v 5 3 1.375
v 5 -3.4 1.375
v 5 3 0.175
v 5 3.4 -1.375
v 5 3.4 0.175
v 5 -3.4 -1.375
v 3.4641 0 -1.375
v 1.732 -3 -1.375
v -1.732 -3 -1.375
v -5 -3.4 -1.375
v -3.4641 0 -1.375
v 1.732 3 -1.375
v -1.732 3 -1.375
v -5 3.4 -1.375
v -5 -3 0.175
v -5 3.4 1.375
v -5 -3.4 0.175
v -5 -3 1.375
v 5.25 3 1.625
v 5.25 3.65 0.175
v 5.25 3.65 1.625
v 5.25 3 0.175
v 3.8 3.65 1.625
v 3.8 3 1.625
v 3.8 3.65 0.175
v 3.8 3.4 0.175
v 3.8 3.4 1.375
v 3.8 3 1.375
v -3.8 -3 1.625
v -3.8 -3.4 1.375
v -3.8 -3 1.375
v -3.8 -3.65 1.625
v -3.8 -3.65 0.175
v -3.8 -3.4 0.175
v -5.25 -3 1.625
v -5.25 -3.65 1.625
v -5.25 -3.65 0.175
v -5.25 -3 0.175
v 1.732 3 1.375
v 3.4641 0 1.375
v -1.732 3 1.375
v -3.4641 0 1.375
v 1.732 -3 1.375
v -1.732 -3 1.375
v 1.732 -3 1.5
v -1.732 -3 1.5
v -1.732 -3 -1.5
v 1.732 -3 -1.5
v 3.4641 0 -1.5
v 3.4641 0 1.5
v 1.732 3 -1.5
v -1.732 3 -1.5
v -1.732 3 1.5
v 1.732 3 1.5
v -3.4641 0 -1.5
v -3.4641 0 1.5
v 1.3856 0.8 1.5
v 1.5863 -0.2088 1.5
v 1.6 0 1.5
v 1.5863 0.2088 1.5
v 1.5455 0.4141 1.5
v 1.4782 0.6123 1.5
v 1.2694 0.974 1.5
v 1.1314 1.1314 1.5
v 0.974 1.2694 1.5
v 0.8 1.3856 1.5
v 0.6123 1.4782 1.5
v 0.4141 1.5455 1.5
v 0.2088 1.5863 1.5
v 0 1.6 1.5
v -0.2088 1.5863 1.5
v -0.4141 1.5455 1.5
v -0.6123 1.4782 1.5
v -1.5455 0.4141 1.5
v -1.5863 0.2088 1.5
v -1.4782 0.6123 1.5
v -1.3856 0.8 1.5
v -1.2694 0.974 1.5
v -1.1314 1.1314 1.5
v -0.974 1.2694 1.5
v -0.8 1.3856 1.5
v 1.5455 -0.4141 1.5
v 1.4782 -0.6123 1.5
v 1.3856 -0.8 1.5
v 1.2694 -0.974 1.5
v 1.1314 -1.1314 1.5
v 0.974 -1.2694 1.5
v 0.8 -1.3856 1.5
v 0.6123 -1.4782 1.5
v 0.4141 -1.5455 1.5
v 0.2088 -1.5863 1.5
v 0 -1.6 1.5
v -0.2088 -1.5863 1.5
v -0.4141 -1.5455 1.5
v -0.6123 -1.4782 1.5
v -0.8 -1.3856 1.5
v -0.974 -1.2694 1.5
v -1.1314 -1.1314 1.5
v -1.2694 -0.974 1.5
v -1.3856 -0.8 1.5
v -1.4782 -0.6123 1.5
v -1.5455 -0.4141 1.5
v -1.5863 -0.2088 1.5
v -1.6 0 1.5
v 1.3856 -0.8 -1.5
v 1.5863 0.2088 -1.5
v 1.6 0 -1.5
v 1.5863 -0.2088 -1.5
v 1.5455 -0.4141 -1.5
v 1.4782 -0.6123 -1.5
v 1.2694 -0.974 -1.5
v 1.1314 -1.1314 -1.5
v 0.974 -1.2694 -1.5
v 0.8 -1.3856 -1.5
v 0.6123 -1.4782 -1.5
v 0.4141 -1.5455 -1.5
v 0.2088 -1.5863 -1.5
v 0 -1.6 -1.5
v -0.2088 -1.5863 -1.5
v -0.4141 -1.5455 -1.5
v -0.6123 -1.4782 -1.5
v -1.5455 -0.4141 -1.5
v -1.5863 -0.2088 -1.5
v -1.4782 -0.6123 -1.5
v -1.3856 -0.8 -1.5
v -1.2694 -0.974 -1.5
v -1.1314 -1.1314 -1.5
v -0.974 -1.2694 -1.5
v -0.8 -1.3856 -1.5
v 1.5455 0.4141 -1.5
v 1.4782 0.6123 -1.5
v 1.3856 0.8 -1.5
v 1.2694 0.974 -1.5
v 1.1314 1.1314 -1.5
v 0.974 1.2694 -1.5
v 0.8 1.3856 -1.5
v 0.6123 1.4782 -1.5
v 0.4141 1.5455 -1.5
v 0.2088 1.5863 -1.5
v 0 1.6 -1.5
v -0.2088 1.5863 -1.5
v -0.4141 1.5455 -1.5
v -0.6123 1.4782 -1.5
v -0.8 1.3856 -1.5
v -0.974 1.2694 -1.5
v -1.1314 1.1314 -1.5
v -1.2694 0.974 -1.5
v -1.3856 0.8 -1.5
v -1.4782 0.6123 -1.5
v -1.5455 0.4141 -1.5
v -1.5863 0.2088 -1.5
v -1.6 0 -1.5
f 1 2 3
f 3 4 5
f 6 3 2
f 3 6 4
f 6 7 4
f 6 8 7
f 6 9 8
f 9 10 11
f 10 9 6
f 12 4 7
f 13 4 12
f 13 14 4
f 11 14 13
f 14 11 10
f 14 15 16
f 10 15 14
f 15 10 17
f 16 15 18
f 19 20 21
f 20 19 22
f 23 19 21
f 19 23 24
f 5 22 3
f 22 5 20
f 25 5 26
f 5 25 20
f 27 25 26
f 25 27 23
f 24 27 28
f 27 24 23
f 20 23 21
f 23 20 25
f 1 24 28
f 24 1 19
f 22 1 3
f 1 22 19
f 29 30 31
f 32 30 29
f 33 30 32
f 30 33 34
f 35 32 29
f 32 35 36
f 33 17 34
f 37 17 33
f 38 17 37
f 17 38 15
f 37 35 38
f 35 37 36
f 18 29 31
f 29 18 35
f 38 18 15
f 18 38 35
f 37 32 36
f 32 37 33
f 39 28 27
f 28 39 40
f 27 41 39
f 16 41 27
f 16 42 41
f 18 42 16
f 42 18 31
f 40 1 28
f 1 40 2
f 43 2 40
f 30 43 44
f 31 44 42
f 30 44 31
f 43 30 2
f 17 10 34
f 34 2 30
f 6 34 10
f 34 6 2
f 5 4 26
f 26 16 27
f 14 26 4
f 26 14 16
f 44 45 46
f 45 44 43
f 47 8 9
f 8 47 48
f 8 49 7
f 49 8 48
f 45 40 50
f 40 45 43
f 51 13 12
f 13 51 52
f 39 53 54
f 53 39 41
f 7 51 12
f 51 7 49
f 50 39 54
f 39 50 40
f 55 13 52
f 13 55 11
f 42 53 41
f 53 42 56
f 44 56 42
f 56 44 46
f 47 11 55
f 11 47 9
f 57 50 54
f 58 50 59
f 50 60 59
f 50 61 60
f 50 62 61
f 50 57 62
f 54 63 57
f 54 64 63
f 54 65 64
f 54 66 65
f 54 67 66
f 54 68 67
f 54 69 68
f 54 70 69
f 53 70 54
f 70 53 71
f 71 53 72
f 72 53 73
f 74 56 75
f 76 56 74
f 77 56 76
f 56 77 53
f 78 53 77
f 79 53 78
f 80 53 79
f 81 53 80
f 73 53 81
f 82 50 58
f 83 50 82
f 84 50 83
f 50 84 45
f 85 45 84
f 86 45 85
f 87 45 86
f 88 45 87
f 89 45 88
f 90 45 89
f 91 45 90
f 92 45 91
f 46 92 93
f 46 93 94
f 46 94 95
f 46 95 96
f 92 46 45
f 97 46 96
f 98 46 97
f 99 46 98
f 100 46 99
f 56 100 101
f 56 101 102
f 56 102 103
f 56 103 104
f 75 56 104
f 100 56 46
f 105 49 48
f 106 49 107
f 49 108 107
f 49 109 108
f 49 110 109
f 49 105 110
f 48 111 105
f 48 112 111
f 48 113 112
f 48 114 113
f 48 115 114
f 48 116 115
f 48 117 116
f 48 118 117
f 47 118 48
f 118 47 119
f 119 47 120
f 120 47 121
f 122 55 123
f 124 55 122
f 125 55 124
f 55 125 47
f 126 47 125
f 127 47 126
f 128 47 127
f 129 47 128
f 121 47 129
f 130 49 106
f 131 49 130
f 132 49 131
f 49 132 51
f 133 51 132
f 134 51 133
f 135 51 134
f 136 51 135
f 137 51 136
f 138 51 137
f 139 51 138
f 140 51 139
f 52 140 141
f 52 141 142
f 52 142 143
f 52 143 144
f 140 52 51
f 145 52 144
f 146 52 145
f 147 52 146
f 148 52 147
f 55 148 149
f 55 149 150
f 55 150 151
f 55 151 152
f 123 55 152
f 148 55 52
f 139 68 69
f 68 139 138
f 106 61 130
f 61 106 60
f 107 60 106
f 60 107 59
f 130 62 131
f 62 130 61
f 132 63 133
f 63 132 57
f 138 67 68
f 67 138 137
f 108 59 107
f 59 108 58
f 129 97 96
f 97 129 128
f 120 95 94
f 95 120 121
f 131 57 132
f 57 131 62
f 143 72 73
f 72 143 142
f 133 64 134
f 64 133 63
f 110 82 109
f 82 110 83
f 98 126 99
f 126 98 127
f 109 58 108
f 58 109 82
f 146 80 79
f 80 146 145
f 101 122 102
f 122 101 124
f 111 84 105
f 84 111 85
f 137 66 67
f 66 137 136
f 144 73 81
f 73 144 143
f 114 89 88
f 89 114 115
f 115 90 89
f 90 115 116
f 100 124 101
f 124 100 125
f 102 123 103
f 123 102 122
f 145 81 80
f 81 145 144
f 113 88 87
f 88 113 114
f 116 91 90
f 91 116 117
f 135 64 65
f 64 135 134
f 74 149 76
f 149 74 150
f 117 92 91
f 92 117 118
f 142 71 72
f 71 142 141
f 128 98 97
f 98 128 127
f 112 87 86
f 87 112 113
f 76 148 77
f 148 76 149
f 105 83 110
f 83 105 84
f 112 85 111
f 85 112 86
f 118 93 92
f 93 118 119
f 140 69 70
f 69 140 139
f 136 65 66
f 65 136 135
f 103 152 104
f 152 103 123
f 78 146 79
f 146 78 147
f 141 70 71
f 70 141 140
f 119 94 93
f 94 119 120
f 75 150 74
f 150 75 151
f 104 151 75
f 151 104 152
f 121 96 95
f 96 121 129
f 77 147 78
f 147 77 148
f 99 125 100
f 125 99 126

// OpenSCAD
// T-slot / hammer nut for M3 screw
// Targets: 3.0mm screw hole, 6.0mm across flats hex, 2.75mm thick overall
// One connected solid, no floating parts, no washer ring.

$fn = 64;

// Parameters (kept from original where relevant)
screw_nominal_diameter_mm = 3;          //[1.5:6:0.1]
nut_across_flats_mm = 6;                //[3:12:0.1]
nut_thickness_mm = 2.75;                //[1.4:5.5:0.05]
thread_clearance_diameter_mm = 3.2;     //[2.8:4:0.05]
tap_drill_diameter_mm = 2.5;            //[2:3:0.05]
hole_style_select = 0;                  //[0:1:1] 0=clearance, 1=tap drill
edge_chamfer_mm = 0.2;                  //[0:1:0.05]
t_slot_nut_overall_length_mm = 10;      //[6:20:0.5]
t_slot_nut_overall_width_mm = 6.8;      //[5:12:0.1]
t_slot_neck_width_mm = 4.2;             //[3:8:0.1]
retention_lip_height_mm = 0.6;          //[0.3:1.5:0.05]
anti_rotation_rib_depth_mm = 0.4;       //[0:1.5:0.05]
anti_rotation_rib_width_mm = 1.2;       //[0.6:3:0.1]
anti_rotation_rib_height_mm = 1.2;      //[0.6:2.75:0.05]
overlap_mm = 0.25;                      //[0.2:2:0.1]

// Derived
hex_circumradius_mm = nut_across_flats_mm / sqrt(3); // across flats -> circumradius
hole_diameter_mm = (hole_style_select == 0) ? thread_clearance_diameter_mm : tap_drill_diameter_mm;

module chamfered_block(size=[10,6,2.75], chamfer=0.2, center=true) {
  // Simple 45° edge chamfer on top/bottom perimeter using hull of two offset rectangles
  // (keeps it robust and connected; avoids floating geometry)
  x = size[0]; y = size[1]; z = size[2];
  c = max(0, min(chamfer, min(x,y)/4, z/4));
  if (c <= 0) {
    cube(size, center=center);
  } else {
    translate(center ? [0,0,0] : [x/2,y/2,z/2])
      hull() {
        translate([0,0, (z/2 - c)]) cube([x, y, 2*c], center=true);
        translate([0,0, -(z/2 - c)]) cube([x, y, 2*c], center=true);
        cube([x-2*c, y-2*c, z], center=true);
      }
  }
}

module tslot_nut() {
  difference() {
    union() {
      // Main T-slot body (rectangular hammer nut form)
      chamfered_block(
        size=[t_slot_nut_overall_length_mm, t_slot_nut_overall_width_mm, nut_thickness_mm],
        chamfer=edge_chamfer_mm,
        center=true
      );

      // Central hex boss (6mm across flats), kept within overall thickness
      // Slight overlap ensures a single connected solid.
      cylinder(r=hex_circumradius_mm, h=nut_thickness_mm + overlap_mm, center=true, $fn=6);

      // Retention lips (bottom side), connected by overlap into main body
      lip_w = (t_slot_nut_overall_width_mm - t_slot_neck_width_mm)/2;
      lip_w_eff = max(0, lip_w);
      if (lip_w_eff > 0) {
        z_lip = -nut_thickness_mm/2 + retention_lip_height_mm/2 + overlap_mm/2;
        y_off = t_slot_neck_width_mm/2 + lip_w_eff/2 - overlap_mm/2;

        translate([0,  y_off, z_lip])
          cube([t_slot_nut_overall_length_mm, lip_w_eff, retention_lip_height_mm + overlap_mm], center=true);

        translate([0, -y_off, z_lip])
          cube([t_slot_nut_overall_length_mm, lip_w_eff, retention_lip_height_mm + overlap_mm], center=true);
      }

      // Anti-rotation ribs on top face edges (optional), connected by overlap
      rib_h = min(anti_rotation_rib_height_mm, nut_thickness_mm);
      if (anti_rotation_rib_depth_mm > 0 && anti_rotation_rib_width_mm > 0 && rib_h > 0) {
        z_rib = nut_thickness_mm/2 - rib_h/2 + overlap_mm/2;
        x_rib = t_slot_nut_overall_length_mm/2 - anti_rotation_rib_width_mm/2 + overlap_mm/2;
        y_rib = t_slot_nut_overall_width_mm/2 - anti_rotation_rib_depth_mm/2 + overlap_mm/2;

        translate([ x_rib,  y_rib, z_rib])
          cube([anti_rotation_rib_width_mm + overlap_mm, anti_rotation_rib_depth_mm + overlap_mm, rib_h + overlap_mm], center=true);

        translate([-x_rib, -y_rib, z_rib])
          cube([anti_rotation_rib_width_mm + overlap_mm, anti_rotation_rib_depth_mm + overlap_mm, rib_h + overlap_mm], center=true);
      }
    }

    // Through-hole for M3 screw (clearance or tap drill)
    cylinder(d=hole_diameter_mm, h=nut_thickness_mm + 2, center=true, $fn=48);
  }
}

tslot_nut();
